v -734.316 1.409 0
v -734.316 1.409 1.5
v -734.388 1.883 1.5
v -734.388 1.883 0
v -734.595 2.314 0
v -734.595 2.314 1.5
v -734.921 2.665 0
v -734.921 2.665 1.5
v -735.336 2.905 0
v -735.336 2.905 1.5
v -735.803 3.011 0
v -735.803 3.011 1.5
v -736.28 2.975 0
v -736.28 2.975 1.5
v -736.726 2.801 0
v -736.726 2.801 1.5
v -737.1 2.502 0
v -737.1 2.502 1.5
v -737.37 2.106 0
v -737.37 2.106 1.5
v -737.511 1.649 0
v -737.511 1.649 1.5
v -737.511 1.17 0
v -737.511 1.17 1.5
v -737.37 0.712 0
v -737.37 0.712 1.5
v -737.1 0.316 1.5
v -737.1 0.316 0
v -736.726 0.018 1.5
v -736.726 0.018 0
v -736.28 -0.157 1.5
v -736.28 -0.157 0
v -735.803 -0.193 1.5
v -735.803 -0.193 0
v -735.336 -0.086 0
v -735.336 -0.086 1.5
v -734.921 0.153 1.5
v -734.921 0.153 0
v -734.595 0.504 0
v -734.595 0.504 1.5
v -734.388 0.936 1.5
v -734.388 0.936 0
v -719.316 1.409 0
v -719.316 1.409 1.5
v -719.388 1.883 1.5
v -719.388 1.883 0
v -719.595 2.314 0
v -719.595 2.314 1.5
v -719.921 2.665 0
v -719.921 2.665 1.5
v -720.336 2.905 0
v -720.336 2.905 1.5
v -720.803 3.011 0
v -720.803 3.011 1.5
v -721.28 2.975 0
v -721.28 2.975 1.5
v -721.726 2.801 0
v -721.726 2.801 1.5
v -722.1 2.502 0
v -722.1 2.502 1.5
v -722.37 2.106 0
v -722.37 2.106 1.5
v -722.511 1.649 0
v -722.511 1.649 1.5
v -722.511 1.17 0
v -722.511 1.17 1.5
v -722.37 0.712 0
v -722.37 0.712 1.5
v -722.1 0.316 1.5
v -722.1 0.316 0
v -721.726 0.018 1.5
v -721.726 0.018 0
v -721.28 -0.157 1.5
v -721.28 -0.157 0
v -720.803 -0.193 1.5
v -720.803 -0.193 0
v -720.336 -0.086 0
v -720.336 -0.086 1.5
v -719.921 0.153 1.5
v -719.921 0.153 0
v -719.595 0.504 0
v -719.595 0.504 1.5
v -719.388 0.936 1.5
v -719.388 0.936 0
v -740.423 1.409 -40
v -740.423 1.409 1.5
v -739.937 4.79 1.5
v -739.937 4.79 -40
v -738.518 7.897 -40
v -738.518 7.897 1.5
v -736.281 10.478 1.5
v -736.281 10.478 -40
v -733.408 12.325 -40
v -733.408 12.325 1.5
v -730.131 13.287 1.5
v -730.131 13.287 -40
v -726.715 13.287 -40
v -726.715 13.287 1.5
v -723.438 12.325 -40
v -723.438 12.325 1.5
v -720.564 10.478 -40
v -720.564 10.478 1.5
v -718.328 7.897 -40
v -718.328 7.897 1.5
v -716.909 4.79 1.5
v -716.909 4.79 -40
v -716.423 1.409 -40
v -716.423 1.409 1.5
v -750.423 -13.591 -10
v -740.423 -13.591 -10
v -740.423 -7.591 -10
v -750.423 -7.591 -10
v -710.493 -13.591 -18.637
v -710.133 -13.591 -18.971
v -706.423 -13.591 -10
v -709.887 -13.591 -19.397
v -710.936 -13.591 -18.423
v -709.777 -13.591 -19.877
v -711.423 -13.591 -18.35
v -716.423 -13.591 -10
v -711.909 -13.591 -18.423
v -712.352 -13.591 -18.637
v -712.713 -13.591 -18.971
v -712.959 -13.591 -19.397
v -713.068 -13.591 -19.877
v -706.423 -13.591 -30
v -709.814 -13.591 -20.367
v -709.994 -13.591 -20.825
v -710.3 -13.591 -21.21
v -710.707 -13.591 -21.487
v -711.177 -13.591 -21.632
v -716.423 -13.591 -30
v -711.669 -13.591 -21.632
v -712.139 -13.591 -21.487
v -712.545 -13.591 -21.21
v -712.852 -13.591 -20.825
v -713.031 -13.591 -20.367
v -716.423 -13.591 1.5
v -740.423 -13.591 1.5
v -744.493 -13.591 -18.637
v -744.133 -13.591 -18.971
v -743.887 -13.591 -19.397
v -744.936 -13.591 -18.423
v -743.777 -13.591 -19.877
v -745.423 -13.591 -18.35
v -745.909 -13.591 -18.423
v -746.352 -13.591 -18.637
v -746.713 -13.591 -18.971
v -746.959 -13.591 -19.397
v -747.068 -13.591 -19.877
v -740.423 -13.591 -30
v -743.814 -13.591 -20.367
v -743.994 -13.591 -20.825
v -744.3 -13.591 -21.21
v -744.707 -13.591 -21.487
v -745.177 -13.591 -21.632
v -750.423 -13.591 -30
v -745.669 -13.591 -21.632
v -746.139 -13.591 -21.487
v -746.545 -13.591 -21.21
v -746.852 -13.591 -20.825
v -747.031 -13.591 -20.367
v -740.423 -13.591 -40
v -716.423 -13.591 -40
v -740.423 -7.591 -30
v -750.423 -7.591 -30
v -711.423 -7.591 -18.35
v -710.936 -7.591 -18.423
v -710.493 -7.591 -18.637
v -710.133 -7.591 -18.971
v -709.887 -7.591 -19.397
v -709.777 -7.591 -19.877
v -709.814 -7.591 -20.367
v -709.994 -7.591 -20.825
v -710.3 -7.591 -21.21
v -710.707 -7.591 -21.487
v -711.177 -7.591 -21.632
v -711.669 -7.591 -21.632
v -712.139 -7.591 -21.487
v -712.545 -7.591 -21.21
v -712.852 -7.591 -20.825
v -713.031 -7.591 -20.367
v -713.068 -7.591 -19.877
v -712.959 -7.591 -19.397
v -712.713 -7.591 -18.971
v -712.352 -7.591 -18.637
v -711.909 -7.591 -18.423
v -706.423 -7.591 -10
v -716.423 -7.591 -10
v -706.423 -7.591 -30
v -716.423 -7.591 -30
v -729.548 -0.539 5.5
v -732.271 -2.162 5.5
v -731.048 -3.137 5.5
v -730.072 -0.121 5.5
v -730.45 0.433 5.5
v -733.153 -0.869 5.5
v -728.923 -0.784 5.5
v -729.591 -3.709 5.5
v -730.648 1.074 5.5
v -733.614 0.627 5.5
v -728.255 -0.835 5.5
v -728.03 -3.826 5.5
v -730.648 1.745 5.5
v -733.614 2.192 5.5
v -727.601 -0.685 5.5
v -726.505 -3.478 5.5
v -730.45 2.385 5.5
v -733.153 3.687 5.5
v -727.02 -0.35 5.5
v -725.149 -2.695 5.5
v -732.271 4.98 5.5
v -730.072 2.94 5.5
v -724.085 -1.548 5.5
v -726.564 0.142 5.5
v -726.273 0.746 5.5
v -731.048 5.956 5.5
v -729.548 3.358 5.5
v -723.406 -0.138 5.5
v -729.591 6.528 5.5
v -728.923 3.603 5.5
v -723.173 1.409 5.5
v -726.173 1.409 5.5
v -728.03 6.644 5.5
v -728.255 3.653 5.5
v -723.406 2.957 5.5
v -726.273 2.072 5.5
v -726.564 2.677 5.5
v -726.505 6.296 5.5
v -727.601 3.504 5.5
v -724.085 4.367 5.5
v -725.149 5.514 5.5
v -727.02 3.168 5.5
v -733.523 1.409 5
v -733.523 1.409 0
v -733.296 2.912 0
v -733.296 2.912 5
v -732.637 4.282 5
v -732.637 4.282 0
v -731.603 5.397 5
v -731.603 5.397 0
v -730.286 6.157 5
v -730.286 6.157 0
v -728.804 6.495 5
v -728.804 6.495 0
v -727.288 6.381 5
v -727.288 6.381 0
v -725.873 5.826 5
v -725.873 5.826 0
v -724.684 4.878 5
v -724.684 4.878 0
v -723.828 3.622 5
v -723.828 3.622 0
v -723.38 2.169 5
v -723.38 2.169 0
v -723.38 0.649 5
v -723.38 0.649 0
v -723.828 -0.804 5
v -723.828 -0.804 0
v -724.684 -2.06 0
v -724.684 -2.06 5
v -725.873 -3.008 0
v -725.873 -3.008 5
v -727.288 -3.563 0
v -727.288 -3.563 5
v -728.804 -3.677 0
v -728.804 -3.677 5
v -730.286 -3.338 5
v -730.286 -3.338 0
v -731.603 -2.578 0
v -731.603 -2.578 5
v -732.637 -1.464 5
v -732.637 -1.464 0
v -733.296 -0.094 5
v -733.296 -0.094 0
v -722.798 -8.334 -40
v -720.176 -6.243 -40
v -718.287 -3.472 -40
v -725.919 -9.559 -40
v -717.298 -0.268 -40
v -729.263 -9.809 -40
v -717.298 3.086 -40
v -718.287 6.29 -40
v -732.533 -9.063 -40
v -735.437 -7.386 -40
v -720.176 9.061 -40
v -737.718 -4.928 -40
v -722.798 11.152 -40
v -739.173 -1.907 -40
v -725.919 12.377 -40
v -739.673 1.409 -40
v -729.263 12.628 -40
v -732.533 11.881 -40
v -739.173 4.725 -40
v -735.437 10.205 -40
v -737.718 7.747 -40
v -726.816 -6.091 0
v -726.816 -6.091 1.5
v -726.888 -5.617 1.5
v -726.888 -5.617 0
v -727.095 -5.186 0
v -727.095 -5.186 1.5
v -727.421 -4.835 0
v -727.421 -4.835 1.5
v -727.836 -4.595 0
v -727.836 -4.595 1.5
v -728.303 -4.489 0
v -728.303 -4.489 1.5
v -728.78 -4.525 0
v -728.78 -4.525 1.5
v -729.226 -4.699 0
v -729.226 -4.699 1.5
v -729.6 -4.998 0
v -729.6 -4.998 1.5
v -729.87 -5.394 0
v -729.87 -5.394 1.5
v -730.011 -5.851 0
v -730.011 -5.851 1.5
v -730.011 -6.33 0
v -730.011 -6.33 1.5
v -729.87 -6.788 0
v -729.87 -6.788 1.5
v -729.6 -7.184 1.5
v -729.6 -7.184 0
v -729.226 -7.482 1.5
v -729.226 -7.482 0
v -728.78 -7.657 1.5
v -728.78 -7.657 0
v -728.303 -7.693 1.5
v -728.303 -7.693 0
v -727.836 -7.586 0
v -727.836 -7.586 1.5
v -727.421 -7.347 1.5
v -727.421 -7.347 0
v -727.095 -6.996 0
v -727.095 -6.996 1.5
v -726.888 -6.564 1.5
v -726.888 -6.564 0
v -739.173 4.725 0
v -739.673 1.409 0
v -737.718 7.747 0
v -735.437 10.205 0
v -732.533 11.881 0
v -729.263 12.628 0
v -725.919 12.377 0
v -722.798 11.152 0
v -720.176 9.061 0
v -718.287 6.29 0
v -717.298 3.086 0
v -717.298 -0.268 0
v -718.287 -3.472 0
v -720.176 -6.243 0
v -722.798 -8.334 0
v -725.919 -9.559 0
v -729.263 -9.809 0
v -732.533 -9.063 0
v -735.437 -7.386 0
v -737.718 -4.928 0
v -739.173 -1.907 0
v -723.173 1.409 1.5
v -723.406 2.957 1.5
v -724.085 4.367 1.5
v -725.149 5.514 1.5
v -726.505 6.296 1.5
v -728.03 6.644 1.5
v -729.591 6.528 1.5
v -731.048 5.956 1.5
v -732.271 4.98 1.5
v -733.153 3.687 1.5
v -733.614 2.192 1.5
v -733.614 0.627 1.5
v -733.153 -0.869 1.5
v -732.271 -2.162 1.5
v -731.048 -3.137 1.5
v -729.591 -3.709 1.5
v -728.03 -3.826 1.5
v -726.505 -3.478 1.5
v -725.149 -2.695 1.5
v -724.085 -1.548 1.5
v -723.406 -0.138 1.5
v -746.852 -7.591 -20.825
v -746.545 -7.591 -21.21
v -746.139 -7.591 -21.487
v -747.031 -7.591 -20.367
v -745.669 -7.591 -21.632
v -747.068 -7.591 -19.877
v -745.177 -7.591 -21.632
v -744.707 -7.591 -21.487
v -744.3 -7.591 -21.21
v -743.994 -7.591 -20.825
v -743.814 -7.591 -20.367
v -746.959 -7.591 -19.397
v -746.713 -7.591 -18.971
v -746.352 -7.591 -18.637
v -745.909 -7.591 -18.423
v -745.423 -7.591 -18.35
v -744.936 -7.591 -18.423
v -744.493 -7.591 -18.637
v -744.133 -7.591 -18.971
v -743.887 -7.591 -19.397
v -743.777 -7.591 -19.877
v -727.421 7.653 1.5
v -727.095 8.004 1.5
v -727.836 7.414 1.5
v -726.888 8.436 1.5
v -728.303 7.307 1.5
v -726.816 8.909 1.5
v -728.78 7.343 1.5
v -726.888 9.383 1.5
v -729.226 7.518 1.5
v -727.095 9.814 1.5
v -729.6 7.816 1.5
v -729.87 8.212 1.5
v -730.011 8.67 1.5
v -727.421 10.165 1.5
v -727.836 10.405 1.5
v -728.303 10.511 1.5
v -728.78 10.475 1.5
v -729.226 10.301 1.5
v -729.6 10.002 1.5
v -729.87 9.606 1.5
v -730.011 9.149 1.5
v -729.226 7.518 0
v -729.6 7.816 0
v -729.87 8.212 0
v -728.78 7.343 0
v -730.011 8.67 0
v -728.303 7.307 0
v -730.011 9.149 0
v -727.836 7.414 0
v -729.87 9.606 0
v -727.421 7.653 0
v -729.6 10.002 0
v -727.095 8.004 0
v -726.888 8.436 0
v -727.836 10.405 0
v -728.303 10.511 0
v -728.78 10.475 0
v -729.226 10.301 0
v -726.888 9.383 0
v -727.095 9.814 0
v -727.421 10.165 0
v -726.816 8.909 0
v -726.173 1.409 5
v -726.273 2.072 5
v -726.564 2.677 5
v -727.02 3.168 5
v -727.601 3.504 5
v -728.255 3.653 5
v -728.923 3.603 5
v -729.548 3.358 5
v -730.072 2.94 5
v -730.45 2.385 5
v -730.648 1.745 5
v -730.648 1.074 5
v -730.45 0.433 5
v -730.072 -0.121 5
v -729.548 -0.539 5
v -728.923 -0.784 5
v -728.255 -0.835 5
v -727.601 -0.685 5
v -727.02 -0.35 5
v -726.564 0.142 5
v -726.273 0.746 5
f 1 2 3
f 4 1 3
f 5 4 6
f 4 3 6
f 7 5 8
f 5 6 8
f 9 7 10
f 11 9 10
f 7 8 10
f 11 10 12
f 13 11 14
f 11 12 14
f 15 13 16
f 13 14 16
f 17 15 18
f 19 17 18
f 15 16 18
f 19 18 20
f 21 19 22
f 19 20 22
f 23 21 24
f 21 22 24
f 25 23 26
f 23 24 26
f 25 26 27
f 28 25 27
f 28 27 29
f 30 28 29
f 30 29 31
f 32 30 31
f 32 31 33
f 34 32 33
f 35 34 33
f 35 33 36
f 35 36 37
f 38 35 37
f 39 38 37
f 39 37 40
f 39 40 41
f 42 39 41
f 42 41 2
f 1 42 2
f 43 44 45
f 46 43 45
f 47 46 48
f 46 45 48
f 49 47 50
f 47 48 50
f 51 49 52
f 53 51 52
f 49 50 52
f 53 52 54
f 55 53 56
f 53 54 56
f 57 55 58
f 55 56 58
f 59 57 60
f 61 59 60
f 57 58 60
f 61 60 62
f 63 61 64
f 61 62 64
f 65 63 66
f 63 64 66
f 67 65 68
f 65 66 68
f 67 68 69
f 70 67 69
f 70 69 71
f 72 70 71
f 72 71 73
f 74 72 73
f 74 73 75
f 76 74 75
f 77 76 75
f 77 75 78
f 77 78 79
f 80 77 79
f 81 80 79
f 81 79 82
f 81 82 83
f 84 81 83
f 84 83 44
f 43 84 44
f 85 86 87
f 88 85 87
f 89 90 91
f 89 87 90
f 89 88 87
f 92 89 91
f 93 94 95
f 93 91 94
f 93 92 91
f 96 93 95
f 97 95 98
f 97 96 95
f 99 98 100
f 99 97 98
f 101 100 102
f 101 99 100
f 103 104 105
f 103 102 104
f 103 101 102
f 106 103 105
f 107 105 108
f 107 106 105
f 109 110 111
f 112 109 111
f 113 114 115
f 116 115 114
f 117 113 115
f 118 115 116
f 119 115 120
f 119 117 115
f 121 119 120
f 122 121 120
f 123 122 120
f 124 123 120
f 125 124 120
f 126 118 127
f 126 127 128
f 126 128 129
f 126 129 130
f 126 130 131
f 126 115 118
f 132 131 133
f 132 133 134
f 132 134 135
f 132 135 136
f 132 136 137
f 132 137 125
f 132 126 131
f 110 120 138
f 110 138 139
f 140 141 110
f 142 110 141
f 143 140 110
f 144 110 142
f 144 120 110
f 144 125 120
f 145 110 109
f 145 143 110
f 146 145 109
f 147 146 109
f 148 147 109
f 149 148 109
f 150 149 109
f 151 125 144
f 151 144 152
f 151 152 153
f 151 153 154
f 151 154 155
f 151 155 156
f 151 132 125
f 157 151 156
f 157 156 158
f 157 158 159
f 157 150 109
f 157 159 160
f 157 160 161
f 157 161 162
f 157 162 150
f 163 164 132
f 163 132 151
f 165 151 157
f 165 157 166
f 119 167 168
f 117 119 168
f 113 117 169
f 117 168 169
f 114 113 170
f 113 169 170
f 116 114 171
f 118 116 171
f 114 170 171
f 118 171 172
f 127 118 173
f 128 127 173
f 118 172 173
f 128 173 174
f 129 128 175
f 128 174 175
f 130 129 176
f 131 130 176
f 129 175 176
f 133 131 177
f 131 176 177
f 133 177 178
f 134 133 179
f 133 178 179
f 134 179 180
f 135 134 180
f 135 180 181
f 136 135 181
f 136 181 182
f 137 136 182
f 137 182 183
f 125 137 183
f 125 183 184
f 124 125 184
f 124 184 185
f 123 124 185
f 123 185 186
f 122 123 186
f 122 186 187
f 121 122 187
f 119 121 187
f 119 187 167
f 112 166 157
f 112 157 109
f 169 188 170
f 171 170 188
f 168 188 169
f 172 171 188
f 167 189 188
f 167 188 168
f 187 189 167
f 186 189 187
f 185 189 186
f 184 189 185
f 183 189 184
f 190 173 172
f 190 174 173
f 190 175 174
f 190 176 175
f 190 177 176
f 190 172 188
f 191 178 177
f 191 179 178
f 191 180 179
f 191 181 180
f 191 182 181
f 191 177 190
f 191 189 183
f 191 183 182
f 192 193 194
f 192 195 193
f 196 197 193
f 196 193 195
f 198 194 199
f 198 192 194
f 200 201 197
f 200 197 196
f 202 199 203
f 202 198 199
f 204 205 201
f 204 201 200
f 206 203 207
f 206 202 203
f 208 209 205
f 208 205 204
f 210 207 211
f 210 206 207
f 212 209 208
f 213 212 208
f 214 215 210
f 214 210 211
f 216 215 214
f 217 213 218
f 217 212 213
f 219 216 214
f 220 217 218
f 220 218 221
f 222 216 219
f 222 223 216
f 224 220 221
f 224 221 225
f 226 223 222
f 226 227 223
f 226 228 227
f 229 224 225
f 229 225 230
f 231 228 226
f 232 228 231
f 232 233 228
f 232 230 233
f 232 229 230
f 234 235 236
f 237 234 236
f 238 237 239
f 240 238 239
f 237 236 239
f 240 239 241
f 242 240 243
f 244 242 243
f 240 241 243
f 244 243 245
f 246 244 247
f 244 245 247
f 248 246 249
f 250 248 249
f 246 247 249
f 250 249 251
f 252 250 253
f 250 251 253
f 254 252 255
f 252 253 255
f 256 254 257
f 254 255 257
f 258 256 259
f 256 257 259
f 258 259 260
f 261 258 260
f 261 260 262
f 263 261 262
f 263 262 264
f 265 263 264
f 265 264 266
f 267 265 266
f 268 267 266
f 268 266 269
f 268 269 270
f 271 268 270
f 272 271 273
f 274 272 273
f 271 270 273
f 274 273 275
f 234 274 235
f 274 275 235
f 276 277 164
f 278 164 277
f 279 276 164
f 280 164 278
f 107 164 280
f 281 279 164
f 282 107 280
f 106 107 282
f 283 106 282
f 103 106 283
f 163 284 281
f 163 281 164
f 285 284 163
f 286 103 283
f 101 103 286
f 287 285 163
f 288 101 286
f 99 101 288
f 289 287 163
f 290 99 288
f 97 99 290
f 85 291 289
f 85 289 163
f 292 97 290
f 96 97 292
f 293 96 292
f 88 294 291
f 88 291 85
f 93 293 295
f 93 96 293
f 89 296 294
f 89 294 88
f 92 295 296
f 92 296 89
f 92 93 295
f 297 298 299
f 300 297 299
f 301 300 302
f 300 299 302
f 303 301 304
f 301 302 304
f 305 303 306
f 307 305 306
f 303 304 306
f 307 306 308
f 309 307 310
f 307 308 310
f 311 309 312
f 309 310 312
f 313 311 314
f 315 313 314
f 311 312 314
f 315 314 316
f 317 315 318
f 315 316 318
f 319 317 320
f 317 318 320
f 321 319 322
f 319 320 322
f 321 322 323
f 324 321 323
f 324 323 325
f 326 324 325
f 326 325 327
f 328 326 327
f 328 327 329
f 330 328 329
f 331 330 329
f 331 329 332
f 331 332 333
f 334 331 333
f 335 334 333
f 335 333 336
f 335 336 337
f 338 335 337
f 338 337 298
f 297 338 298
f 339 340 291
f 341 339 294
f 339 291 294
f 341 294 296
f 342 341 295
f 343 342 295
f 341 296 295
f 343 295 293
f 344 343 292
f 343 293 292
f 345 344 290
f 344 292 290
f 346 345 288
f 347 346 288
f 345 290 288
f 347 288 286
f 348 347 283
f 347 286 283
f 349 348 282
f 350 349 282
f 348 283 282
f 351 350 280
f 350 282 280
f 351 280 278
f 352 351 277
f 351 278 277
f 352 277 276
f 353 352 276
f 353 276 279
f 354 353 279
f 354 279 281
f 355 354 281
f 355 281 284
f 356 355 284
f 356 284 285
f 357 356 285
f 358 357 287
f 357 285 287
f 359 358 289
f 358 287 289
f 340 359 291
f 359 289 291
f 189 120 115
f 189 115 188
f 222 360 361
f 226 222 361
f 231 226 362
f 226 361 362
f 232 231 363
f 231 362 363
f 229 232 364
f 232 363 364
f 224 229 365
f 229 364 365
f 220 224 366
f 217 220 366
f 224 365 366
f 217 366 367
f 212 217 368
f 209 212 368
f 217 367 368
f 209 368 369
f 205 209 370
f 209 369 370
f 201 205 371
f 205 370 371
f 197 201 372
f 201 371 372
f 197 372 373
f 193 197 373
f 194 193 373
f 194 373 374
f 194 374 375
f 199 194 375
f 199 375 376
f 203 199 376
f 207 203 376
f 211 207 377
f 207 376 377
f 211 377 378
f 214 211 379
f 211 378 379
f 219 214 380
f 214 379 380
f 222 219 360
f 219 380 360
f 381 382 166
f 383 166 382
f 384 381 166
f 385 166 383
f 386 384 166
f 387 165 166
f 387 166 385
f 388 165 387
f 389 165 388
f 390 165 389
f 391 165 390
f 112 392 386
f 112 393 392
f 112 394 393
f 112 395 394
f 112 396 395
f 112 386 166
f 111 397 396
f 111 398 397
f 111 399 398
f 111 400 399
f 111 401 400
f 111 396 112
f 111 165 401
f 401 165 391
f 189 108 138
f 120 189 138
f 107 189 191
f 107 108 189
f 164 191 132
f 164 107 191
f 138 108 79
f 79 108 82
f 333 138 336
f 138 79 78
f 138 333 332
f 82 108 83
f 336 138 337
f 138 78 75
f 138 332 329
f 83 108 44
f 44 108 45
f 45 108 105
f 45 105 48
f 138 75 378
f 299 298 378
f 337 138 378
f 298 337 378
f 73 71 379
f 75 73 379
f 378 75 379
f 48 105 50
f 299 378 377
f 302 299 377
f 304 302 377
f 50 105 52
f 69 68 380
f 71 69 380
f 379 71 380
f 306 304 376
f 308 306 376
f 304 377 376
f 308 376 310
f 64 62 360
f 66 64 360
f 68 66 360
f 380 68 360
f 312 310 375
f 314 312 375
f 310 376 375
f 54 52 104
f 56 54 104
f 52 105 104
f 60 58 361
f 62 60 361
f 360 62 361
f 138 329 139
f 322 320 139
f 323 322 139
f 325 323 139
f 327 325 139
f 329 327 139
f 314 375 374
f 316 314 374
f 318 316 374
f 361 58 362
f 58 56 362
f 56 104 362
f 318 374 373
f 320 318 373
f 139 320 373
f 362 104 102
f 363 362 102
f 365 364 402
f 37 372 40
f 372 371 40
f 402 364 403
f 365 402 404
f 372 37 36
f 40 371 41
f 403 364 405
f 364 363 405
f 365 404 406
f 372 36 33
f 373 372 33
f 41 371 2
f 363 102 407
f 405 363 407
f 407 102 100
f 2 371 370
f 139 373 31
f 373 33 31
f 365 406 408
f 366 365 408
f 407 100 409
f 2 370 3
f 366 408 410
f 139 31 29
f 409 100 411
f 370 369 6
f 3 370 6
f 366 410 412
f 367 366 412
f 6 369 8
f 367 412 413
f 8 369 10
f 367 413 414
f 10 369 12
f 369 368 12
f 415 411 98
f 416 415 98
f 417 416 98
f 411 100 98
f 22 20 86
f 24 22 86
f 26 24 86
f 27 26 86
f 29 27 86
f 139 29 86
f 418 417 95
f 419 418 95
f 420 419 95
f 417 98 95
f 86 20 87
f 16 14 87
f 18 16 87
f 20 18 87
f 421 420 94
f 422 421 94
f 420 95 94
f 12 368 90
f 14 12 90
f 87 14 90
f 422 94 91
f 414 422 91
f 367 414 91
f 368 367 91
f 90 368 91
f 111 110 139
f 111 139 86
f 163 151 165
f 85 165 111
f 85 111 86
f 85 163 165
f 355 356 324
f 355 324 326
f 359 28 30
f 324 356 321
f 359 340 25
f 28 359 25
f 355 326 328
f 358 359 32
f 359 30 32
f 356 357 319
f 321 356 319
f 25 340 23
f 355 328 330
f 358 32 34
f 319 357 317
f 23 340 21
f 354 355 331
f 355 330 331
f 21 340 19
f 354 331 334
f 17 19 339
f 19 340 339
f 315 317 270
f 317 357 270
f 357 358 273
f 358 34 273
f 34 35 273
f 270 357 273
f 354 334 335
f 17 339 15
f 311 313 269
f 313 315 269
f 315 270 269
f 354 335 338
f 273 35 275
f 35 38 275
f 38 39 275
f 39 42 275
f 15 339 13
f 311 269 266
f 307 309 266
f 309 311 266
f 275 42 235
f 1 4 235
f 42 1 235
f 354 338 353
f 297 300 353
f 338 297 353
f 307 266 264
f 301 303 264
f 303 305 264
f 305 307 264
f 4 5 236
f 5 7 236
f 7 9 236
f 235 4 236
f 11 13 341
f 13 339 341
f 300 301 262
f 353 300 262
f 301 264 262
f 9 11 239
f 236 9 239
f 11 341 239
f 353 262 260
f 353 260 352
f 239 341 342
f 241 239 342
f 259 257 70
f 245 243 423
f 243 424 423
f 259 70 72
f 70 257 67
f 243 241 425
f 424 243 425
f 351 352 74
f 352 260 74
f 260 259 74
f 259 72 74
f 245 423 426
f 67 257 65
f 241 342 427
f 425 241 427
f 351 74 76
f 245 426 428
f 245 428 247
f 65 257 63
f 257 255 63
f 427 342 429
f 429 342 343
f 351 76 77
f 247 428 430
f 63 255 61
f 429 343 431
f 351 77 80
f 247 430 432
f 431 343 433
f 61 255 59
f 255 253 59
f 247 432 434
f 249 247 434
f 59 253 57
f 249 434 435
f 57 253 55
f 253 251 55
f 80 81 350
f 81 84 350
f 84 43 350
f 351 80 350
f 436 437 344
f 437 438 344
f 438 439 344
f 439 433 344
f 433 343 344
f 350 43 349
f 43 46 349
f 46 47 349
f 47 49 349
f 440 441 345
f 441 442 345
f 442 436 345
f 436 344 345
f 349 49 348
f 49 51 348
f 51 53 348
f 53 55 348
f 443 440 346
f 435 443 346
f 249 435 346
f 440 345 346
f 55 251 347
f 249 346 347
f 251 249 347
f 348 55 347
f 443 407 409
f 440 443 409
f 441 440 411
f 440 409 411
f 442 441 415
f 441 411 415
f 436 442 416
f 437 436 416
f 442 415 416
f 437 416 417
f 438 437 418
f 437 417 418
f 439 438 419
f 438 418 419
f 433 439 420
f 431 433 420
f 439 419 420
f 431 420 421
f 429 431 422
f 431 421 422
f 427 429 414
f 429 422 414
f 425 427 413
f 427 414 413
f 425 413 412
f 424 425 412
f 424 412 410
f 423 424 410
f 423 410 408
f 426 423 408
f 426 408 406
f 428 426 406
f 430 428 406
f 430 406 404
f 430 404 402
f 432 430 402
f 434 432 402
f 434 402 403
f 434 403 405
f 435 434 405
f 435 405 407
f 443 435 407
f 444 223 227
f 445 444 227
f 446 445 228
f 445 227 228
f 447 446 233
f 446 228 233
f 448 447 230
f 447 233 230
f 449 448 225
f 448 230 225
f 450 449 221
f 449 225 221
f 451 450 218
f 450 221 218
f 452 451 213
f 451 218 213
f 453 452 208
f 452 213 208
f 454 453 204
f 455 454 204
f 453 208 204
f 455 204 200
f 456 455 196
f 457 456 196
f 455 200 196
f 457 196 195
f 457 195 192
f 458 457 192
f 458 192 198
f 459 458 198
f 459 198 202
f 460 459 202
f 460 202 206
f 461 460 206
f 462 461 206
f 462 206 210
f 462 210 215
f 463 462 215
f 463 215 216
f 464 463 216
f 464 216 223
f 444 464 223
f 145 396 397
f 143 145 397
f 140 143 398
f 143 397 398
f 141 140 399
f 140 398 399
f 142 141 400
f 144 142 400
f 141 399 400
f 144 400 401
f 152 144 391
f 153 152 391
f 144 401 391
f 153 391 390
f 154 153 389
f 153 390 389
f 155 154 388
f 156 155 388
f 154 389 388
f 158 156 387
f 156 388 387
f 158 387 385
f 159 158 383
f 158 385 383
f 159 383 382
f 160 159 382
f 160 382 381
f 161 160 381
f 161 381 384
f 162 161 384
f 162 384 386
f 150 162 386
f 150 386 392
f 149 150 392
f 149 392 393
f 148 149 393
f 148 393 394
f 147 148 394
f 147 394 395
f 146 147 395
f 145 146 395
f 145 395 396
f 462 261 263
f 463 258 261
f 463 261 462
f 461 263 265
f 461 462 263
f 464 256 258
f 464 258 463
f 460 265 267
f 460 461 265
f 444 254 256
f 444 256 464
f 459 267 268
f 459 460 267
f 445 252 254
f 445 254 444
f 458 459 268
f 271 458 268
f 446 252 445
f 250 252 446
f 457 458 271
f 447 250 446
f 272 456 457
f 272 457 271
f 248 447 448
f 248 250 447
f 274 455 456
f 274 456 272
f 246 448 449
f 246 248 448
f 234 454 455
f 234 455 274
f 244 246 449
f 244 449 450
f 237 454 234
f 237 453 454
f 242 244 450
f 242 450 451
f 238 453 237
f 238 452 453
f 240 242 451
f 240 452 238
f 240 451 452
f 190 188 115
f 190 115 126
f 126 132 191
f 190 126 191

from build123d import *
from build123d.topology import SkipClean

# Parameters (mm, degrees)
CROQUIS1_R              = 12
SALIENTE_EXTRUIR1_DEPTH = 1.5
CROQUIS2_R              = 1.606590309
CORTAR_EXTRUIR1_DEPTH   = 2
CROQUIS3_R              = 5.25
SALIENTE_EXTRUIR2_DEPTH = 4
CROQUIS4_R              = 5.1
CORTAR_EXTRUIR2_DEPTH   = 5
CROQUIS5_R              = 2.25
CORTAR_EXTRUIR3_DEPTH   = 5
SALIENTE_EXTRUIR3_START = 40
CROQUIS7_R              = 12
CROQUIS7_R_2            = 11.25
SALIENTE_EXTRUIR3_DEPTH = 40
SALIENTE_EXTRUIR4_DEPTH = 41.5
CROQUIS9_W              = 20
CROQUIS9_H              = 6
SALIENTE_EXTRUIR5_DEPTH = 10
CROQUIS10_W             = 20
CROQUIS10_H             = 6
SALIENTE_EXTRUIR6_DEPTH = 10
CROQUIS11_R             = 1.65
CORTAR_EXTRUIR4_DEPTH   = 10


with BuildPart() as part:
    # Croquis1 → Saliente-Extruir1 (new body)
    with BuildSketch(Plane.XY):
        with Locations((-728.422782565, 1.40916901)):
            Circle(CROQUIS1_R)
    extrude(amount=SALIENTE_EXTRUIR1_DEPTH)

    # Croquis2 → Cortar-Extruir1 (cut)
    with BuildSketch(Plane.XY.offset(1.5)):
        with Locations((-728.422782565, 8.90916901)):
            Circle(CROQUIS2_R)
        with Locations((-720.922782565, 1.40916901)):
            Circle(CROQUIS2_R)
        with Locations((-728.422782565, -6.09083099)):
            Circle(CROQUIS2_R)
        with Locations((-735.922782565, 1.40916901)):
            Circle(CROQUIS2_R)
    extrude(amount=-CORTAR_EXTRUIR1_DEPTH, mode=Mode.SUBTRACT)

    # Croquis3 → Saliente-Extruir2 (add)
    with BuildSketch(Plane.XY.offset(1.5)):
        with Locations((-728.422782565, 1.40916901)):
            Circle(CROQUIS3_R)
    extrude(amount=SALIENTE_EXTRUIR2_DEPTH)

    # Croquis4 → Cortar-Extruir2 (cut)
    with BuildSketch(Plane(origin=(0, 0, 0), x_dir=(-1, 0, 0), z_dir=(0, 0, -1))):
        with Locations((728.422782565, 1.40916901)):
            Circle(CROQUIS4_R)
    extrude(amount=-CORTAR_EXTRUIR2_DEPTH, mode=Mode.SUBTRACT)

    # Croquis5 → Cortar-Extruir3 (cut)
    with BuildSketch(Plane.XY.offset(5.5)):
        with Locations((-728.422782565, 1.40916901)):
            Circle(CROQUIS5_R)
    extrude(amount=-CORTAR_EXTRUIR3_DEPTH, mode=Mode.SUBTRACT)

    # Croquis7 → Saliente-Extruir3 (add)
    with BuildSketch(Plane(origin=(0, 0, 0), x_dir=(-1, 0, 0), z_dir=(0, 0, -1)).offset(SALIENTE_EXTRUIR3_START)):
        with Locations((728.422782565, 1.40916901)):
            Circle(CROQUIS7_R)
        with Locations((728.422782565, 1.40916901)):
            Circle(CROQUIS7_R_2, mode=Mode.SUBTRACT)
    extrude(amount=-SALIENTE_EXTRUIR3_DEPTH)

    # Croquis8 → Saliente-Extruir4 (add)
    with SkipClean():  # the faces are left unmerged after this step: merging them gives an invalid solid
        with BuildSketch(Plane(origin=(0, 0, -40), x_dir=(-1, 0, 0), z_dir=(0, 0, -1))):
            with BuildLine():
                Line((716.422782565, 1.40916901), (716.422782565, -13.59083099))
                Line((716.422782565, -13.59083099), (728.422782565, -13.59083099))
                Line((728.422782565, -13.59083099), (740.422782565, -13.59083099))
                Line((740.422782565, -13.59083099), (740.422782565, 1.40916901))
                ThreePointArc((740.422782565, 1.40916901), (728.422782565, -10.59083099), (716.422782565, 1.40916901))
            make_face()
        extrude(amount=-SALIENTE_EXTRUIR4_DEPTH)
    add(part.part.scale(1), mode=Mode.REPLACE)  # the faces are merged on a copy

    # Croquis9 → Saliente-Extruir5 (add)
    with BuildSketch(Plane.ZY.offset(740.422782565)):
        with Locations((-20, -10.59083099)):
            Rectangle(CROQUIS9_W, CROQUIS9_H)
    extrude(amount=SALIENTE_EXTRUIR5_DEPTH)

    # Croquis10 → Saliente-Extruir6 (add)
    with BuildSketch(Plane(origin=(-716.422782565, 0, 0), x_dir=(0, 0, -1), z_dir=(1, 0, 0))):
        with Locations((20, -10.59083099)):
            Rectangle(CROQUIS10_W, CROQUIS10_H)
    extrude(amount=SALIENTE_EXTRUIR6_DEPTH)

    # Croquis11 → Cortar-Extruir4 (cut)
    with BuildSketch(Plane(origin=(0, -7.59083099, 0), x_dir=(1, 0, 0), z_dir=(0, 1, 0))):
        with Locations((-745.422782565, 20)):
            Circle(CROQUIS11_R)
        with Locations((-711.422782565, 20)):
            Circle(CROQUIS11_R)
    extrude(amount=-CORTAR_EXTRUIR4_DEPTH, mode=Mode.SUBTRACT)


solid = part.part
